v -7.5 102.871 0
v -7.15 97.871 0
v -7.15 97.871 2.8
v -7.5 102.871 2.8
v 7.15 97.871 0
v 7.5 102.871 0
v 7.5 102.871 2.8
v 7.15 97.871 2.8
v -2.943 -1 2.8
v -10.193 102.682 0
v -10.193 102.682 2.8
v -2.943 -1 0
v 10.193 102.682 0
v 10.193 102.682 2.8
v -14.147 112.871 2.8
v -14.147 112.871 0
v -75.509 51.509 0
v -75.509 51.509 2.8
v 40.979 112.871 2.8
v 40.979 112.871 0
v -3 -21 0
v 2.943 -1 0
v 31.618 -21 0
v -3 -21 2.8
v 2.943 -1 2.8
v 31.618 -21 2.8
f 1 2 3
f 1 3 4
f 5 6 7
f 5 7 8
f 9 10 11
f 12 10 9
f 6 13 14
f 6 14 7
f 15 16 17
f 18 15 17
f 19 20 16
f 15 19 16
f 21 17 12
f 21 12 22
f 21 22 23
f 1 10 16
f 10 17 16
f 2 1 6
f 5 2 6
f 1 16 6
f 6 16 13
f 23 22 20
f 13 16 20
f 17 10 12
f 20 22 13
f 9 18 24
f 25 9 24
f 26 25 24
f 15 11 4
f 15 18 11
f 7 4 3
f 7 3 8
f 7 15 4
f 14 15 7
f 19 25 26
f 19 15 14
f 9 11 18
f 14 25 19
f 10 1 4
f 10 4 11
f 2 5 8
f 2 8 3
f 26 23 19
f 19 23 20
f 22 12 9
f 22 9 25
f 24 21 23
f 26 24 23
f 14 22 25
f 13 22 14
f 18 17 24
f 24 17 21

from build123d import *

# Parameters (mm, degrees)
BOSS_EXTRUDE1_DEPTH = 2.8


with BuildPart() as part:
    # Sketch1 → Boss-Extrude1 (new body)
    with BuildSketch(Plane.XY):
        Polygon((40.979118187, 112.870740647), (-14.14721608, 112.870740647), (-75.508978364, 51.508978364), (-3, -21), (31.617964081, -21), align=None)
        Polygon((-2.943243377, -1), (2.943243377, -1), (10.193422936, 102.682398168), (7.5, 102.870740647), (7.15036594, 97.870740647), (-7.15036594, 97.870740647), (-7.5, 102.870740647), (-10.193422936, 102.682398168), align=None, mode=Mode.SUBTRACT)
    extrude(amount=BOSS_EXTRUDE1_DEPTH)


solid = part.part
